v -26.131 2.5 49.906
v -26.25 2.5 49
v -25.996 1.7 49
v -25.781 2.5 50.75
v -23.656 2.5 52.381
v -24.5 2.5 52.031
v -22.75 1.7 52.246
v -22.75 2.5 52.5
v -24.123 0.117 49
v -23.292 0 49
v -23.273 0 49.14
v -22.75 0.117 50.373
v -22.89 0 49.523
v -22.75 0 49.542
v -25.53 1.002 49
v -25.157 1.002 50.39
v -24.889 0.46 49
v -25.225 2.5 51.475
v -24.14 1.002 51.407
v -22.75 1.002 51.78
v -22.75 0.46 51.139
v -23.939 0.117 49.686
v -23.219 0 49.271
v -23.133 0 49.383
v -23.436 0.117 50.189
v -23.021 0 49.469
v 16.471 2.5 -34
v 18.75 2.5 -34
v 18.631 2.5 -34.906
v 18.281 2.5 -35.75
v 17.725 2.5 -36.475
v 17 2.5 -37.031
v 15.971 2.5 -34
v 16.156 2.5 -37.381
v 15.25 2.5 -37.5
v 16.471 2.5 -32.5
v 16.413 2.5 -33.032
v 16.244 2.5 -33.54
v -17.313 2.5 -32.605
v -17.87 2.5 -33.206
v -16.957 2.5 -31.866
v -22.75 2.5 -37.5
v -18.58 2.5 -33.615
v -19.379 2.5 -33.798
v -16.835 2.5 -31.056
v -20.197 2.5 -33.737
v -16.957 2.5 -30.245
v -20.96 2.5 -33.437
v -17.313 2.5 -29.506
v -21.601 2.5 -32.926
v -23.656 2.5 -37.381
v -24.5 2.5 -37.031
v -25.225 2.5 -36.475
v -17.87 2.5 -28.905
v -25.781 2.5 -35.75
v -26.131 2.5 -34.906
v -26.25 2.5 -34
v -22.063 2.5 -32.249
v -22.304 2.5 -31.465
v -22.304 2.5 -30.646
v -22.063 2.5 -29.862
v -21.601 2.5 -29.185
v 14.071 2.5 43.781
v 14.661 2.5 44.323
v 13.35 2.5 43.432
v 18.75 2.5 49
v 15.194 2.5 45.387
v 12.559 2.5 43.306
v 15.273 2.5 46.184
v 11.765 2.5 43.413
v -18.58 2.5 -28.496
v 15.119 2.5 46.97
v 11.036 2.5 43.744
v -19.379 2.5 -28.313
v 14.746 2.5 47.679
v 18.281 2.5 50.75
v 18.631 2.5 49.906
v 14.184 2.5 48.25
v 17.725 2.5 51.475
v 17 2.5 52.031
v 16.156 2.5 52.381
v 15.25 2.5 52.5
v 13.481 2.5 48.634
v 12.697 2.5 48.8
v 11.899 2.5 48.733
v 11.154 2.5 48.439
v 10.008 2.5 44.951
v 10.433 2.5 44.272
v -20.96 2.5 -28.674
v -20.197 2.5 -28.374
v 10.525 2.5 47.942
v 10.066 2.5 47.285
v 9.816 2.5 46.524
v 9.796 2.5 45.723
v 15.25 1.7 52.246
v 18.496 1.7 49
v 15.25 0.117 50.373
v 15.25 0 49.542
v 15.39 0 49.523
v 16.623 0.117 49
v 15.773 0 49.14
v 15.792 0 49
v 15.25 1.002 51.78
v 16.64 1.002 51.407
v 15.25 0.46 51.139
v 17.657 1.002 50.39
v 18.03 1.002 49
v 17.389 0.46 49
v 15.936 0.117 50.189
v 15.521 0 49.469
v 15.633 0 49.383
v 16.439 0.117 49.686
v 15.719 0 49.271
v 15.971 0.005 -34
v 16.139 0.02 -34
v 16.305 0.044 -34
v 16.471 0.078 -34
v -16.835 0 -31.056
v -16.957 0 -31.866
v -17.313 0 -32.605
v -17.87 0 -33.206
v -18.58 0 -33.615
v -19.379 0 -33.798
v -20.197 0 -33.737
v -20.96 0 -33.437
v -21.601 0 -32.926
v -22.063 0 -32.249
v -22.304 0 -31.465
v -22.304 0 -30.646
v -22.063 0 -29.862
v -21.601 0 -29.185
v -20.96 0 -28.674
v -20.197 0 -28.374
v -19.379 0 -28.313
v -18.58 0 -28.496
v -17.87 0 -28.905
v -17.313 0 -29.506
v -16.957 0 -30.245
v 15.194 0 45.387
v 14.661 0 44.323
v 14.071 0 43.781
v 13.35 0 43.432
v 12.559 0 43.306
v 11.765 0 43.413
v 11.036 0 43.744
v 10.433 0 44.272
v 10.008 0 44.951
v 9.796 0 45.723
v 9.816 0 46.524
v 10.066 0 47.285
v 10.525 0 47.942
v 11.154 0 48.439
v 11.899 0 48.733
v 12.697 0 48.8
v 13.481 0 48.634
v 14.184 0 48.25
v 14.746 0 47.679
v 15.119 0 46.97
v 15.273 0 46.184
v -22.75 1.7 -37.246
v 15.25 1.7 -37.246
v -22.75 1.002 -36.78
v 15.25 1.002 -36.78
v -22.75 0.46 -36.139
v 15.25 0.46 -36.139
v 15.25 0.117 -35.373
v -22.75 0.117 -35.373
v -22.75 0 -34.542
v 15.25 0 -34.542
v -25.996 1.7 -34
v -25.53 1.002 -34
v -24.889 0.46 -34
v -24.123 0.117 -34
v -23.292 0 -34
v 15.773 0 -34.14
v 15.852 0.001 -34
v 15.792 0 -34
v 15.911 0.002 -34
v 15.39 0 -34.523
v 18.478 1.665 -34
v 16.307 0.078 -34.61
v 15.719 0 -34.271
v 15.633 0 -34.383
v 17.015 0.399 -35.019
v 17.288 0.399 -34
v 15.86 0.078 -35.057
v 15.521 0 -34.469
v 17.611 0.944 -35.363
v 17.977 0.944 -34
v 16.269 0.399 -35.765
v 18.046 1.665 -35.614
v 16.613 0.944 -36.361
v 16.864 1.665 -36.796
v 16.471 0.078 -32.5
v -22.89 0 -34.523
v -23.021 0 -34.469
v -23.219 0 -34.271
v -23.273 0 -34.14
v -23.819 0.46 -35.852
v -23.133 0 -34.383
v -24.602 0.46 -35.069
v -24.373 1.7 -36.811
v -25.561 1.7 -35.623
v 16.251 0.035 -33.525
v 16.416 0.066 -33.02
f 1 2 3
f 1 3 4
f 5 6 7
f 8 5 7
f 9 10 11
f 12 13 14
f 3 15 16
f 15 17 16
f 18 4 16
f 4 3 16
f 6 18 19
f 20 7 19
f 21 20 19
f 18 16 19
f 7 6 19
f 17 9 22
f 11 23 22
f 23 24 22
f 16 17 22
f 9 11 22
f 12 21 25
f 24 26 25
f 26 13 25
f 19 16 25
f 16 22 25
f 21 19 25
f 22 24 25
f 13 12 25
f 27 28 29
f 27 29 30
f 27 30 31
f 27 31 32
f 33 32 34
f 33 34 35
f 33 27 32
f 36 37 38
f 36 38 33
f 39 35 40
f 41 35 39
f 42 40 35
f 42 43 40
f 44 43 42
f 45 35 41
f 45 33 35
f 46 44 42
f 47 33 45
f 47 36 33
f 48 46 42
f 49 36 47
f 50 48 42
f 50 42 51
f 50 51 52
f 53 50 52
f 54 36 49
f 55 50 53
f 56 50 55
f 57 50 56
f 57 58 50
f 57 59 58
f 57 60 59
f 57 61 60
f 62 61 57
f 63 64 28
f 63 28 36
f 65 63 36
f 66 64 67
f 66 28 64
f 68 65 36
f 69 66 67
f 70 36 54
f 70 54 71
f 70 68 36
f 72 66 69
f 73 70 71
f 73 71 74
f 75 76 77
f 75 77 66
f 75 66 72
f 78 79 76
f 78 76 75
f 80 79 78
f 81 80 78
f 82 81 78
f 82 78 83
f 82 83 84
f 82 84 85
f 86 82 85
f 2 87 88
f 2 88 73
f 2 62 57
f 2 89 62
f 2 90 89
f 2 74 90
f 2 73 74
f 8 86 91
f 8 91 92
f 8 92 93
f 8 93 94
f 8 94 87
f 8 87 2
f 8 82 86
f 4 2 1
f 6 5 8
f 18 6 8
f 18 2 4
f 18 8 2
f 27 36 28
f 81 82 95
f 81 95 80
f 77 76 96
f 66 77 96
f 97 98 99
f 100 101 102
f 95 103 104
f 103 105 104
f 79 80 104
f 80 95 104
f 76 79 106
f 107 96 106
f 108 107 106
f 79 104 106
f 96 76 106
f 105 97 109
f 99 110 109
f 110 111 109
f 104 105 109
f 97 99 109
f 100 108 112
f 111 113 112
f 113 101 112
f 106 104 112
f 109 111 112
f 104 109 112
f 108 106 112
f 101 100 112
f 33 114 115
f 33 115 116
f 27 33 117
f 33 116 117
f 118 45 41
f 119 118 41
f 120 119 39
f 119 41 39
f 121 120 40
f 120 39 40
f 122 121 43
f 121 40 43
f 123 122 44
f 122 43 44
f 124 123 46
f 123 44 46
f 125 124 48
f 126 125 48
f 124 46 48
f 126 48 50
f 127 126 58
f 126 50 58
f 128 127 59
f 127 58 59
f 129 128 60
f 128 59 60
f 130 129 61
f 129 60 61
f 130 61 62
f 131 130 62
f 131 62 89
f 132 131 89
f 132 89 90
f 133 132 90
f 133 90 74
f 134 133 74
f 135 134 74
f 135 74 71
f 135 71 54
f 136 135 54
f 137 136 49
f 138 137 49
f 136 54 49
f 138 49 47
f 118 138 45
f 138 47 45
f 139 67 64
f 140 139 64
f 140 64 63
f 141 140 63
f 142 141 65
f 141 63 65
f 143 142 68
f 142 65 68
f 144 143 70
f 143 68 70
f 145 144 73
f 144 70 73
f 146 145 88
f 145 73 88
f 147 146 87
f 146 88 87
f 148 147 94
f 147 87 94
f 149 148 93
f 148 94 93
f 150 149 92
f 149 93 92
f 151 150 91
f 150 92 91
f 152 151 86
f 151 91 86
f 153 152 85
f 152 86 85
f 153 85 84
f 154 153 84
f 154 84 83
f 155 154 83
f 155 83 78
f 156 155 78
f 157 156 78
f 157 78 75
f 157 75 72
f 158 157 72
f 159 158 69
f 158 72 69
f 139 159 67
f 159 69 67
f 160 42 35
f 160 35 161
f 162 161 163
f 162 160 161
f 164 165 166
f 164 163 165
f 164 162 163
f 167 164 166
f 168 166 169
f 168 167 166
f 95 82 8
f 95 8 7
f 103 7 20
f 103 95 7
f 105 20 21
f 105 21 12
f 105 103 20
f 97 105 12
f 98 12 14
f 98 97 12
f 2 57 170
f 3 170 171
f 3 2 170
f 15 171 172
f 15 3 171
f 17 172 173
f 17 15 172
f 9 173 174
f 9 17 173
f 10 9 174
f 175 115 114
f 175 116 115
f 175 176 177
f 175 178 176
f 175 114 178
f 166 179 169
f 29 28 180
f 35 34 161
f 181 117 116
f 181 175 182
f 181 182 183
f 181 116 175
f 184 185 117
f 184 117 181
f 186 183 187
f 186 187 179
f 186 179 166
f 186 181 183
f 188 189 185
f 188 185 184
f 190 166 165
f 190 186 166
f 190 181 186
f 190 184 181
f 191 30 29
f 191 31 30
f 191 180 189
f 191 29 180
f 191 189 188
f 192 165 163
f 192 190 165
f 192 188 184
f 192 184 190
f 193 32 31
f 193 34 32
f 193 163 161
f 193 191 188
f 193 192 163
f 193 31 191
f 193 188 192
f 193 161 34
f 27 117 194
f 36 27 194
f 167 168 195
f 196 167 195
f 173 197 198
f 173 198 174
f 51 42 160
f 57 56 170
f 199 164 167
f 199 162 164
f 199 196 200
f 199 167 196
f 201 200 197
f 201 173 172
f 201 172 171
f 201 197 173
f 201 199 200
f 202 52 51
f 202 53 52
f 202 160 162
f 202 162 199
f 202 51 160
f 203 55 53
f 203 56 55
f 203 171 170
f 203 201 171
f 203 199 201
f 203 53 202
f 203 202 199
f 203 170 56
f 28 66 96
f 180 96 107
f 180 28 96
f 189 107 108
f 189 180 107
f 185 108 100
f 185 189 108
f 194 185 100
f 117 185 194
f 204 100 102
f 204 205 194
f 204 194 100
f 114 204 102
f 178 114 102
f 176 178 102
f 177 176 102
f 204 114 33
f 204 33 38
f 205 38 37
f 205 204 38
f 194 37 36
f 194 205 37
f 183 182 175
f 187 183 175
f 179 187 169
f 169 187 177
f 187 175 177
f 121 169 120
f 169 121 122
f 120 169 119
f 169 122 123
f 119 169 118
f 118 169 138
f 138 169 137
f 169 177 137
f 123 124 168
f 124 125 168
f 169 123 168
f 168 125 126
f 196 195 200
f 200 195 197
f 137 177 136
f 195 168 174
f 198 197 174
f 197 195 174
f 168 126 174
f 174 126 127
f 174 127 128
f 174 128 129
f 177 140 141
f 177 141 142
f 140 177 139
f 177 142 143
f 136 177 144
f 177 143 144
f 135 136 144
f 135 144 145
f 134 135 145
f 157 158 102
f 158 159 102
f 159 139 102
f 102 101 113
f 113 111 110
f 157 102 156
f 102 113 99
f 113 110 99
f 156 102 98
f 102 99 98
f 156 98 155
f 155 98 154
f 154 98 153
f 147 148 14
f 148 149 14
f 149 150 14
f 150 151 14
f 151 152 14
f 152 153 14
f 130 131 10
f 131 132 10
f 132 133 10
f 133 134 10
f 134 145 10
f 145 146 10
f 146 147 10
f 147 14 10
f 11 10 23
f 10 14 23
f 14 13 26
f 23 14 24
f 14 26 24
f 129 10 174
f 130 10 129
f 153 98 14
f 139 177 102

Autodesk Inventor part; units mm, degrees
ref_plane "YZ Plane" through (0, 0, 0) normal (1, 0, 0) x (0, 1, 0)
ref_plane "XZ Plane" through (0, 0, 0) normal (0, 1, 0) x (-1, 0, 0)
ref_plane "XY Plane" through (0, 0, 0) normal (0, 0, 1) x (1, 0, 0)
sketch "Sketch1" plane through (0, 0, 0) normal (0, 1, 0) x (-1, 0, 0)
  line L0 (-18.75, 52.5) -> (26.25, 52.5)
  line L1 (26.25, 52.5) -> (26.25, -37.5)
  line L2 (26.25, -37.5) -> (-18.75, -37.5)
  line L3 (-18.75, -37.5) -> (-18.75, 52.5)
  line L4 (26.25, 52.5) -> (-18.75, -37.5) construction
  line L5 (-16.4706, 50) -> (23.5294, 50)
  line L6 (23.5294, 50) -> (23.5294, -35)
  line L7 (23.5294, -35) -> (-16.4706, -35)
  line L8 (-16.4706, -35) -> (-16.4706, 50)
  line L9 (23.5294, 50) -> (-16.4706, -35) construction
  line L10 (23.5294, 50) -> (21.0294, 50)
  line L11 (21.0294, 50) -> (21.0294, 47.5)
  line L12 (21.0294, 47.5) -> (23.5294, 47.5)
  line L13 (23.5294, 47.5) -> (23.5294, 50)
  arc A0 (23.5294, 47.5) -> (21.0294, 50) centre (21.0294, 47.5) ccw
  line L14 (26.25, 52.5) -> (22.75, 52.5)
  line L15 (22.75, 52.5) -> (22.75, 49)
  line L16 (22.75, 49) -> (26.25, 49)
  line L17 (26.25, 49) -> (26.25, 52.5)
  line L18 (23.5294, -35) -> (21.0294, -35)
  line L19 (21.0294, -35) -> (21.0294, -32.5)
  line L20 (21.0294, -32.5) -> (23.5294, -32.5)
  line L21 (23.5294, -32.5) -> (23.5294, -35)
  line L22 (-16.4706, -35) -> (-13.9706, -35)
  line L23 (-13.9706, -35) -> (-13.9706, -32.5)
  line L24 (-13.9706, -32.5) -> (-16.4706, -32.5)
  line L25 (-16.4706, -32.5) -> (-16.4706, -35)
  line L26 (-16.4706, 50) -> (-13.9706, 50)
  line L27 (-13.9706, 50) -> (-13.9706, 47.5)
  line L28 (-13.9706, 47.5) -> (-16.4706, 47.5)
  line L29 (-16.4706, 47.5) -> (-16.4706, 50)
  arc A1 (-13.9706, 50) -> (-16.4706, 47.5) centre (-13.9706, 47.5) ccw
  arc A2 (-16.4706, -32.5) -> (-13.9706, -35) centre (-13.9706, -32.5) ccw
  arc A3 (21.0294, -35) -> (23.5294, -32.5) centre (21.0294, -32.5) ccw
  arc A4 (26.25, 49) -> (22.75, 52.5) centre (22.75, 49) ccw
  line L30 (26.25, -37.5) -> (22.75, -37.5)
  line L31 (22.75, -37.5) -> (22.75, -34)
  line L32 (22.75, -34) -> (26.25, -34)
  line L33 (26.25, -34) -> (26.25, -37.5)
  line L34 (-18.75, -37.5) -> (-15.25, -37.5)
  line L35 (-15.25, -37.5) -> (-15.25, -34)
  line L36 (-15.25, -34) -> (-18.75, -34)
  line L37 (-18.75, -34) -> (-18.75, -37.5)
  line L38 (-18.75, 52.5) -> (-15.25, 52.5)
  line L39 (-15.25, 52.5) -> (-15.25, 49)
  line L40 (-15.25, 49) -> (-18.75, 49)
  line L41 (-18.75, 49) -> (-18.75, 52.5)
  arc A5 (-15.25, 52.5) -> (-18.75, 49) centre (-15.25, 49) ccw
  arc A6 (-18.75, -34) -> (-15.25, -37.5) centre (-15.25, -34) ccw
  arc A7 (22.75, -37.5) -> (26.25, -34) centre (22.75, -34) ccw
  point P0 (0, 0)
  point P1 (26.25, 49)
  point P2 (22.75, 52.5)
  point P3 (-18.75, -34)
  point P4 (-16.4706, -32.5)
  point P5 (-15.9706, -34)
  point P6 (-16.4706, -34)
  point P7 (23.5294, -32.5)
  dimension "d0" = 45
  dimension "d1" = 90
  dimension "d2" = 40
  dimension "d3" = 85
  dimension "d8" = 2.5
  dimension "d9" = 2.5
extrude "Extrusion3" add sketch "Sketch1" along normal blind 2.5 contours L0 L15 L5 L39 | L39 L5 L8 L40 A5 | L40 L8 L36 L3 | A4 L16 L6 L5 L15 | L39 A1 L40 L8 L5 | L5 A1 L39 | L36 L8 L7 L35 A6 | L40 A1 L8 | L15 A0 L5 | L5 L6 L16 A0 L15 | L1 L32 L6 L16 | L5 L11 L12 L6 L20 L19 L7 L23 L24 L8 L28 L27 | L27 L28 A1 L40 L39 | L39 L40 A1 | L36 A2 L35 L7 L8 | L35 L7 L31 L2 | A0 L15 L16 L12 L11 | A0 L16 L15 | A7 L31 L7 L6 L32 | L6 A0 L16 | L24 L23 A2 L35 L36 | L36 L35 A2 | L35 A2 L7 | L32 A3 L6 | L6 L7 L31 A3 L32 | L7 A3 L31 | A3 L32 L31 L19 L20 | A3 L31 L32
fillet "Fillet1" radius 3 8 edges at (-25.2249, 0, 51.4749) (-3.75, 0, 52.5) (17.7249, 0, 51.4749) (18.75, 0, 7.5) (17.7249, 0, -36.4749) (-3.75, 0, -37.5) (-25.2249, 0, -36.4749) (-26.25, 0, 7.5)
sketch "Sketch2" plane through (0, 2.5, 0) normal (0, 1, 0) x (1, 0, 0)
  arc A0 (16.4706, 32.5) -> (13.9706, 35) centre (13.9706, 32.5) ccw projected
  line L0 (13.9706, 35) -> (13.9706, 33.5)
  line L1 (16.4706, -47.5) -> (16.4706, 32.5) projected
  line L2 (16.4706, 32.5) -> (14.9706, 32.5)
  line L3 (14.9706, 32.5) -> (13.9706, 33.5)
  line L4 (14.4706, 33) -> (12.526, 31.0555)
  circle A1 centre (12.526, 31.0555) radius 2.75
  line L5 (-23.5294, 32.5) -> (-23.5294, -47.5) projected
  line L6 (-23.5294, -47.5) -> (-22.0294, -47.5)
  line L7 (-21.0294, -50) -> (13.9706, -50) projected
  line L8 (-21.0294, -50) -> (-21.0294, -48.5)
  line L9 (-21.0294, -48.5) -> (-22.0294, -47.5)
  line L10 (-21.5294, -48) -> (-19.5849, -46.0555)
  line L11 (-21.5294, -48) -> (-18.7794, -48) construction
  circle A2 centre (-19.5849, -46.0555) radius 2.75
  arc A3 (14.0518, 28.7675) -> (15.276, 31.0555) centre (12.526, 31.0555) ccw construction
  arc A4 (14.321, 28.3639) -> (15.7612, 31.0555) centre (12.526, 31.0555) ccw
  arc A5 (13.7826, 29.1712) -> (14.7909, 31.0555) centre (12.526, 31.0555) ccw
  arc A6 (13.7826, 29.1712) -> (14.321, 28.3639) centre (14.0518, 28.7675) ccw
  arc A7 (15.7612, 31.0555) -> (14.7909, 31.0555) centre (15.276, 31.0555) ccw
  arc A8 (10.7311, 33.747) -> (9.2909, 31.0555) centre (12.526, 31.0555) ccw
  arc A9 (9.2909, 31.0555) -> (10.2612, 31.0555) centre (9.776, 31.0555) ccw
  arc A10 (11.2694, 32.9398) -> (10.7311, 33.747) centre (11.0003, 33.3434) ccw
  arc A11 (11.2694, 32.9398) -> (10.2612, 31.0555) centre (12.526, 31.0555) ccw
  arc A12 (-17.79, -48.747) -> (-16.3497, -46.0555) centre (-19.5849, -46.0555) ccw
  arc A13 (-18.3283, -47.9398) -> (-17.32, -46.0555) centre (-19.5849, -46.0555) ccw
  arc A14 (-18.3283, -47.9398) -> (-17.79, -48.747) centre (-18.0591, -48.3434) ccw
  arc A15 (-16.3497, -46.0555) -> (-17.32, -46.0555) centre (-16.8349, -46.0555) ccw
  arc A16 (-21.3798, -43.3639) -> (-22.82, -46.0555) centre (-19.5849, -46.0555) ccw
  arc A17 (-22.82, -46.0555) -> (-21.8497, -46.0555) centre (-22.3349, -46.0555) ccw
  arc A18 (-20.8415, -44.1712) -> (-21.3798, -43.3639) centre (-21.1106, -43.7675) ccw
  arc A19 (-20.8415, -44.1712) -> (-21.8497, -46.0555) centre (-19.5849, -46.0555) ccw
  line L12 (-22.8137, -49.2843) -> (-20.2452, -46.7157) construction
  line L13 (-22.3894, -49.7085) -> (-19.8209, -47.14)
  line L14 (-20.6694, -46.2915) -> (-23.2379, -48.86)
  arc A20 (-23.2379, -48.86) -> (-22.3894, -49.7085) centre (-22.8137, -49.2843) ccw
  arc A21 (-19.8209, -47.14) -> (-20.6694, -46.2915) centre (-20.2452, -46.7157) ccw
  line L15 (12.9911, 31.5205) -> (15.9501, 34.4795) construction
  line L16 (13.4153, 31.0962) -> (16.3744, 34.0552)
  line L17 (15.5258, 34.9038) -> (12.5668, 31.9448)
  arc A22 (12.5668, 31.9448) -> (13.4153, 31.0962) centre (12.9911, 31.5205) ccw
  arc A23 (16.3744, 34.0552) -> (15.5258, 34.9038) centre (15.9501, 34.4795) ccw
  arc A24 (15.25, -52.5) -> (18.75, -49) centre (15.25, -49) ccw projected
  line L18 (15.25, -52.5) -> (18.75, -52.5)
  line L19 (18.75, -52.5) -> (18.75, -49)
  arc A25 (-22.75, 37.5) -> (-26.25, 34) centre (-22.75, 34) ccw projected
  line L20 (-26.25, 34) -> (-26.25, 37.5)
  line L21 (15.25, 37.5) -> (-22.75, 37.5) projected
  line L22 (-26.25, 37.5) -> (-22.75, 37.5)
  line L23 (-22.75, -52.5) -> (15.25, -52.5) projected
  line L24 (-22.75, -52.5) -> (-26.25, -52.5)
  line L25 (-26.25, 34) -> (-26.25, -49) projected
  line L26 (-26.25, -52.5) -> (-26.25, -49)
  line L27 (18.75, -49) -> (18.75, 34) projected
  line L28 (18.75, 37.5) -> (18.75, 34)
  line L29 (15.25, 37.5) -> (15.25, 34.542) projected
  line L30 (18.75, 37.5) -> (15.25, 37.5)
  line L31 (-26.25, -52.5) -> (18.75, 37.5)
  line L32 (18.75, -52.5) -> (-26.25, 37.5)
  line L33 (-3.75, -7.5) -> (32.3445, -7.5)
  line L34 (-35.1724, -7.5) -> (-3.75, -7.5)
  circle A26 centre (12.526, -46.0555) radius 2.75
  circle A27 centre (-19.5849, 31.0555) radius 2.75
  point P0 (0, 0)
  point P1 (14.848, 32.5289)
  point P2 (13.9995, 33.3774)
  point P3 (11.4261, 33.5759)
  point P4 (9.8188, 30.5722)
  point P5 (13.626, 28.535)
  point P6 (15.2333, 31.5387)
  point P7 (-21.9068, -47.5289)
  point P8 (-21.0583, -48.3774)
  point P9 (-18.4849, -48.5759)
  point P10 (-16.8777, -45.5722)
  point P11 (-20.6848, -43.535)
  point P12 (-22.2921, -46.5387)
  point P13 (15.2624, 34.6404)
  point P14 (16.111, 33.7918)
  point P15 (14.6612, -44.3223)
  point P16 (15.1936, -45.3873)
  dimension "d32" = 5.5
  dimension "d29" = 1.5
  dimension "d30" = 1.5
  dimension "d31" = 2.75
  dimension "d33" = 1.5
  dimension "d34" = 1.5
  dimension "d35" = 2.75
  dimension "d36" = 45
  dimension "d37" = 5.5
  dimension "d40" = 360
  dimension "d44" = 1.2
  dimension "d45" = 1.2
extrude "Extrusion10" cut sketch "Sketch2" against normal blind 10 contours L32 A26 | A27 picked at (11.7147, -45.435)
sketch "Sketch4" plane through (0, 2.5, 0) normal (0, 1, 0) x (1, 0, 0)
  point P0 (0, 0)
properties part number "proper shit spodnji"
